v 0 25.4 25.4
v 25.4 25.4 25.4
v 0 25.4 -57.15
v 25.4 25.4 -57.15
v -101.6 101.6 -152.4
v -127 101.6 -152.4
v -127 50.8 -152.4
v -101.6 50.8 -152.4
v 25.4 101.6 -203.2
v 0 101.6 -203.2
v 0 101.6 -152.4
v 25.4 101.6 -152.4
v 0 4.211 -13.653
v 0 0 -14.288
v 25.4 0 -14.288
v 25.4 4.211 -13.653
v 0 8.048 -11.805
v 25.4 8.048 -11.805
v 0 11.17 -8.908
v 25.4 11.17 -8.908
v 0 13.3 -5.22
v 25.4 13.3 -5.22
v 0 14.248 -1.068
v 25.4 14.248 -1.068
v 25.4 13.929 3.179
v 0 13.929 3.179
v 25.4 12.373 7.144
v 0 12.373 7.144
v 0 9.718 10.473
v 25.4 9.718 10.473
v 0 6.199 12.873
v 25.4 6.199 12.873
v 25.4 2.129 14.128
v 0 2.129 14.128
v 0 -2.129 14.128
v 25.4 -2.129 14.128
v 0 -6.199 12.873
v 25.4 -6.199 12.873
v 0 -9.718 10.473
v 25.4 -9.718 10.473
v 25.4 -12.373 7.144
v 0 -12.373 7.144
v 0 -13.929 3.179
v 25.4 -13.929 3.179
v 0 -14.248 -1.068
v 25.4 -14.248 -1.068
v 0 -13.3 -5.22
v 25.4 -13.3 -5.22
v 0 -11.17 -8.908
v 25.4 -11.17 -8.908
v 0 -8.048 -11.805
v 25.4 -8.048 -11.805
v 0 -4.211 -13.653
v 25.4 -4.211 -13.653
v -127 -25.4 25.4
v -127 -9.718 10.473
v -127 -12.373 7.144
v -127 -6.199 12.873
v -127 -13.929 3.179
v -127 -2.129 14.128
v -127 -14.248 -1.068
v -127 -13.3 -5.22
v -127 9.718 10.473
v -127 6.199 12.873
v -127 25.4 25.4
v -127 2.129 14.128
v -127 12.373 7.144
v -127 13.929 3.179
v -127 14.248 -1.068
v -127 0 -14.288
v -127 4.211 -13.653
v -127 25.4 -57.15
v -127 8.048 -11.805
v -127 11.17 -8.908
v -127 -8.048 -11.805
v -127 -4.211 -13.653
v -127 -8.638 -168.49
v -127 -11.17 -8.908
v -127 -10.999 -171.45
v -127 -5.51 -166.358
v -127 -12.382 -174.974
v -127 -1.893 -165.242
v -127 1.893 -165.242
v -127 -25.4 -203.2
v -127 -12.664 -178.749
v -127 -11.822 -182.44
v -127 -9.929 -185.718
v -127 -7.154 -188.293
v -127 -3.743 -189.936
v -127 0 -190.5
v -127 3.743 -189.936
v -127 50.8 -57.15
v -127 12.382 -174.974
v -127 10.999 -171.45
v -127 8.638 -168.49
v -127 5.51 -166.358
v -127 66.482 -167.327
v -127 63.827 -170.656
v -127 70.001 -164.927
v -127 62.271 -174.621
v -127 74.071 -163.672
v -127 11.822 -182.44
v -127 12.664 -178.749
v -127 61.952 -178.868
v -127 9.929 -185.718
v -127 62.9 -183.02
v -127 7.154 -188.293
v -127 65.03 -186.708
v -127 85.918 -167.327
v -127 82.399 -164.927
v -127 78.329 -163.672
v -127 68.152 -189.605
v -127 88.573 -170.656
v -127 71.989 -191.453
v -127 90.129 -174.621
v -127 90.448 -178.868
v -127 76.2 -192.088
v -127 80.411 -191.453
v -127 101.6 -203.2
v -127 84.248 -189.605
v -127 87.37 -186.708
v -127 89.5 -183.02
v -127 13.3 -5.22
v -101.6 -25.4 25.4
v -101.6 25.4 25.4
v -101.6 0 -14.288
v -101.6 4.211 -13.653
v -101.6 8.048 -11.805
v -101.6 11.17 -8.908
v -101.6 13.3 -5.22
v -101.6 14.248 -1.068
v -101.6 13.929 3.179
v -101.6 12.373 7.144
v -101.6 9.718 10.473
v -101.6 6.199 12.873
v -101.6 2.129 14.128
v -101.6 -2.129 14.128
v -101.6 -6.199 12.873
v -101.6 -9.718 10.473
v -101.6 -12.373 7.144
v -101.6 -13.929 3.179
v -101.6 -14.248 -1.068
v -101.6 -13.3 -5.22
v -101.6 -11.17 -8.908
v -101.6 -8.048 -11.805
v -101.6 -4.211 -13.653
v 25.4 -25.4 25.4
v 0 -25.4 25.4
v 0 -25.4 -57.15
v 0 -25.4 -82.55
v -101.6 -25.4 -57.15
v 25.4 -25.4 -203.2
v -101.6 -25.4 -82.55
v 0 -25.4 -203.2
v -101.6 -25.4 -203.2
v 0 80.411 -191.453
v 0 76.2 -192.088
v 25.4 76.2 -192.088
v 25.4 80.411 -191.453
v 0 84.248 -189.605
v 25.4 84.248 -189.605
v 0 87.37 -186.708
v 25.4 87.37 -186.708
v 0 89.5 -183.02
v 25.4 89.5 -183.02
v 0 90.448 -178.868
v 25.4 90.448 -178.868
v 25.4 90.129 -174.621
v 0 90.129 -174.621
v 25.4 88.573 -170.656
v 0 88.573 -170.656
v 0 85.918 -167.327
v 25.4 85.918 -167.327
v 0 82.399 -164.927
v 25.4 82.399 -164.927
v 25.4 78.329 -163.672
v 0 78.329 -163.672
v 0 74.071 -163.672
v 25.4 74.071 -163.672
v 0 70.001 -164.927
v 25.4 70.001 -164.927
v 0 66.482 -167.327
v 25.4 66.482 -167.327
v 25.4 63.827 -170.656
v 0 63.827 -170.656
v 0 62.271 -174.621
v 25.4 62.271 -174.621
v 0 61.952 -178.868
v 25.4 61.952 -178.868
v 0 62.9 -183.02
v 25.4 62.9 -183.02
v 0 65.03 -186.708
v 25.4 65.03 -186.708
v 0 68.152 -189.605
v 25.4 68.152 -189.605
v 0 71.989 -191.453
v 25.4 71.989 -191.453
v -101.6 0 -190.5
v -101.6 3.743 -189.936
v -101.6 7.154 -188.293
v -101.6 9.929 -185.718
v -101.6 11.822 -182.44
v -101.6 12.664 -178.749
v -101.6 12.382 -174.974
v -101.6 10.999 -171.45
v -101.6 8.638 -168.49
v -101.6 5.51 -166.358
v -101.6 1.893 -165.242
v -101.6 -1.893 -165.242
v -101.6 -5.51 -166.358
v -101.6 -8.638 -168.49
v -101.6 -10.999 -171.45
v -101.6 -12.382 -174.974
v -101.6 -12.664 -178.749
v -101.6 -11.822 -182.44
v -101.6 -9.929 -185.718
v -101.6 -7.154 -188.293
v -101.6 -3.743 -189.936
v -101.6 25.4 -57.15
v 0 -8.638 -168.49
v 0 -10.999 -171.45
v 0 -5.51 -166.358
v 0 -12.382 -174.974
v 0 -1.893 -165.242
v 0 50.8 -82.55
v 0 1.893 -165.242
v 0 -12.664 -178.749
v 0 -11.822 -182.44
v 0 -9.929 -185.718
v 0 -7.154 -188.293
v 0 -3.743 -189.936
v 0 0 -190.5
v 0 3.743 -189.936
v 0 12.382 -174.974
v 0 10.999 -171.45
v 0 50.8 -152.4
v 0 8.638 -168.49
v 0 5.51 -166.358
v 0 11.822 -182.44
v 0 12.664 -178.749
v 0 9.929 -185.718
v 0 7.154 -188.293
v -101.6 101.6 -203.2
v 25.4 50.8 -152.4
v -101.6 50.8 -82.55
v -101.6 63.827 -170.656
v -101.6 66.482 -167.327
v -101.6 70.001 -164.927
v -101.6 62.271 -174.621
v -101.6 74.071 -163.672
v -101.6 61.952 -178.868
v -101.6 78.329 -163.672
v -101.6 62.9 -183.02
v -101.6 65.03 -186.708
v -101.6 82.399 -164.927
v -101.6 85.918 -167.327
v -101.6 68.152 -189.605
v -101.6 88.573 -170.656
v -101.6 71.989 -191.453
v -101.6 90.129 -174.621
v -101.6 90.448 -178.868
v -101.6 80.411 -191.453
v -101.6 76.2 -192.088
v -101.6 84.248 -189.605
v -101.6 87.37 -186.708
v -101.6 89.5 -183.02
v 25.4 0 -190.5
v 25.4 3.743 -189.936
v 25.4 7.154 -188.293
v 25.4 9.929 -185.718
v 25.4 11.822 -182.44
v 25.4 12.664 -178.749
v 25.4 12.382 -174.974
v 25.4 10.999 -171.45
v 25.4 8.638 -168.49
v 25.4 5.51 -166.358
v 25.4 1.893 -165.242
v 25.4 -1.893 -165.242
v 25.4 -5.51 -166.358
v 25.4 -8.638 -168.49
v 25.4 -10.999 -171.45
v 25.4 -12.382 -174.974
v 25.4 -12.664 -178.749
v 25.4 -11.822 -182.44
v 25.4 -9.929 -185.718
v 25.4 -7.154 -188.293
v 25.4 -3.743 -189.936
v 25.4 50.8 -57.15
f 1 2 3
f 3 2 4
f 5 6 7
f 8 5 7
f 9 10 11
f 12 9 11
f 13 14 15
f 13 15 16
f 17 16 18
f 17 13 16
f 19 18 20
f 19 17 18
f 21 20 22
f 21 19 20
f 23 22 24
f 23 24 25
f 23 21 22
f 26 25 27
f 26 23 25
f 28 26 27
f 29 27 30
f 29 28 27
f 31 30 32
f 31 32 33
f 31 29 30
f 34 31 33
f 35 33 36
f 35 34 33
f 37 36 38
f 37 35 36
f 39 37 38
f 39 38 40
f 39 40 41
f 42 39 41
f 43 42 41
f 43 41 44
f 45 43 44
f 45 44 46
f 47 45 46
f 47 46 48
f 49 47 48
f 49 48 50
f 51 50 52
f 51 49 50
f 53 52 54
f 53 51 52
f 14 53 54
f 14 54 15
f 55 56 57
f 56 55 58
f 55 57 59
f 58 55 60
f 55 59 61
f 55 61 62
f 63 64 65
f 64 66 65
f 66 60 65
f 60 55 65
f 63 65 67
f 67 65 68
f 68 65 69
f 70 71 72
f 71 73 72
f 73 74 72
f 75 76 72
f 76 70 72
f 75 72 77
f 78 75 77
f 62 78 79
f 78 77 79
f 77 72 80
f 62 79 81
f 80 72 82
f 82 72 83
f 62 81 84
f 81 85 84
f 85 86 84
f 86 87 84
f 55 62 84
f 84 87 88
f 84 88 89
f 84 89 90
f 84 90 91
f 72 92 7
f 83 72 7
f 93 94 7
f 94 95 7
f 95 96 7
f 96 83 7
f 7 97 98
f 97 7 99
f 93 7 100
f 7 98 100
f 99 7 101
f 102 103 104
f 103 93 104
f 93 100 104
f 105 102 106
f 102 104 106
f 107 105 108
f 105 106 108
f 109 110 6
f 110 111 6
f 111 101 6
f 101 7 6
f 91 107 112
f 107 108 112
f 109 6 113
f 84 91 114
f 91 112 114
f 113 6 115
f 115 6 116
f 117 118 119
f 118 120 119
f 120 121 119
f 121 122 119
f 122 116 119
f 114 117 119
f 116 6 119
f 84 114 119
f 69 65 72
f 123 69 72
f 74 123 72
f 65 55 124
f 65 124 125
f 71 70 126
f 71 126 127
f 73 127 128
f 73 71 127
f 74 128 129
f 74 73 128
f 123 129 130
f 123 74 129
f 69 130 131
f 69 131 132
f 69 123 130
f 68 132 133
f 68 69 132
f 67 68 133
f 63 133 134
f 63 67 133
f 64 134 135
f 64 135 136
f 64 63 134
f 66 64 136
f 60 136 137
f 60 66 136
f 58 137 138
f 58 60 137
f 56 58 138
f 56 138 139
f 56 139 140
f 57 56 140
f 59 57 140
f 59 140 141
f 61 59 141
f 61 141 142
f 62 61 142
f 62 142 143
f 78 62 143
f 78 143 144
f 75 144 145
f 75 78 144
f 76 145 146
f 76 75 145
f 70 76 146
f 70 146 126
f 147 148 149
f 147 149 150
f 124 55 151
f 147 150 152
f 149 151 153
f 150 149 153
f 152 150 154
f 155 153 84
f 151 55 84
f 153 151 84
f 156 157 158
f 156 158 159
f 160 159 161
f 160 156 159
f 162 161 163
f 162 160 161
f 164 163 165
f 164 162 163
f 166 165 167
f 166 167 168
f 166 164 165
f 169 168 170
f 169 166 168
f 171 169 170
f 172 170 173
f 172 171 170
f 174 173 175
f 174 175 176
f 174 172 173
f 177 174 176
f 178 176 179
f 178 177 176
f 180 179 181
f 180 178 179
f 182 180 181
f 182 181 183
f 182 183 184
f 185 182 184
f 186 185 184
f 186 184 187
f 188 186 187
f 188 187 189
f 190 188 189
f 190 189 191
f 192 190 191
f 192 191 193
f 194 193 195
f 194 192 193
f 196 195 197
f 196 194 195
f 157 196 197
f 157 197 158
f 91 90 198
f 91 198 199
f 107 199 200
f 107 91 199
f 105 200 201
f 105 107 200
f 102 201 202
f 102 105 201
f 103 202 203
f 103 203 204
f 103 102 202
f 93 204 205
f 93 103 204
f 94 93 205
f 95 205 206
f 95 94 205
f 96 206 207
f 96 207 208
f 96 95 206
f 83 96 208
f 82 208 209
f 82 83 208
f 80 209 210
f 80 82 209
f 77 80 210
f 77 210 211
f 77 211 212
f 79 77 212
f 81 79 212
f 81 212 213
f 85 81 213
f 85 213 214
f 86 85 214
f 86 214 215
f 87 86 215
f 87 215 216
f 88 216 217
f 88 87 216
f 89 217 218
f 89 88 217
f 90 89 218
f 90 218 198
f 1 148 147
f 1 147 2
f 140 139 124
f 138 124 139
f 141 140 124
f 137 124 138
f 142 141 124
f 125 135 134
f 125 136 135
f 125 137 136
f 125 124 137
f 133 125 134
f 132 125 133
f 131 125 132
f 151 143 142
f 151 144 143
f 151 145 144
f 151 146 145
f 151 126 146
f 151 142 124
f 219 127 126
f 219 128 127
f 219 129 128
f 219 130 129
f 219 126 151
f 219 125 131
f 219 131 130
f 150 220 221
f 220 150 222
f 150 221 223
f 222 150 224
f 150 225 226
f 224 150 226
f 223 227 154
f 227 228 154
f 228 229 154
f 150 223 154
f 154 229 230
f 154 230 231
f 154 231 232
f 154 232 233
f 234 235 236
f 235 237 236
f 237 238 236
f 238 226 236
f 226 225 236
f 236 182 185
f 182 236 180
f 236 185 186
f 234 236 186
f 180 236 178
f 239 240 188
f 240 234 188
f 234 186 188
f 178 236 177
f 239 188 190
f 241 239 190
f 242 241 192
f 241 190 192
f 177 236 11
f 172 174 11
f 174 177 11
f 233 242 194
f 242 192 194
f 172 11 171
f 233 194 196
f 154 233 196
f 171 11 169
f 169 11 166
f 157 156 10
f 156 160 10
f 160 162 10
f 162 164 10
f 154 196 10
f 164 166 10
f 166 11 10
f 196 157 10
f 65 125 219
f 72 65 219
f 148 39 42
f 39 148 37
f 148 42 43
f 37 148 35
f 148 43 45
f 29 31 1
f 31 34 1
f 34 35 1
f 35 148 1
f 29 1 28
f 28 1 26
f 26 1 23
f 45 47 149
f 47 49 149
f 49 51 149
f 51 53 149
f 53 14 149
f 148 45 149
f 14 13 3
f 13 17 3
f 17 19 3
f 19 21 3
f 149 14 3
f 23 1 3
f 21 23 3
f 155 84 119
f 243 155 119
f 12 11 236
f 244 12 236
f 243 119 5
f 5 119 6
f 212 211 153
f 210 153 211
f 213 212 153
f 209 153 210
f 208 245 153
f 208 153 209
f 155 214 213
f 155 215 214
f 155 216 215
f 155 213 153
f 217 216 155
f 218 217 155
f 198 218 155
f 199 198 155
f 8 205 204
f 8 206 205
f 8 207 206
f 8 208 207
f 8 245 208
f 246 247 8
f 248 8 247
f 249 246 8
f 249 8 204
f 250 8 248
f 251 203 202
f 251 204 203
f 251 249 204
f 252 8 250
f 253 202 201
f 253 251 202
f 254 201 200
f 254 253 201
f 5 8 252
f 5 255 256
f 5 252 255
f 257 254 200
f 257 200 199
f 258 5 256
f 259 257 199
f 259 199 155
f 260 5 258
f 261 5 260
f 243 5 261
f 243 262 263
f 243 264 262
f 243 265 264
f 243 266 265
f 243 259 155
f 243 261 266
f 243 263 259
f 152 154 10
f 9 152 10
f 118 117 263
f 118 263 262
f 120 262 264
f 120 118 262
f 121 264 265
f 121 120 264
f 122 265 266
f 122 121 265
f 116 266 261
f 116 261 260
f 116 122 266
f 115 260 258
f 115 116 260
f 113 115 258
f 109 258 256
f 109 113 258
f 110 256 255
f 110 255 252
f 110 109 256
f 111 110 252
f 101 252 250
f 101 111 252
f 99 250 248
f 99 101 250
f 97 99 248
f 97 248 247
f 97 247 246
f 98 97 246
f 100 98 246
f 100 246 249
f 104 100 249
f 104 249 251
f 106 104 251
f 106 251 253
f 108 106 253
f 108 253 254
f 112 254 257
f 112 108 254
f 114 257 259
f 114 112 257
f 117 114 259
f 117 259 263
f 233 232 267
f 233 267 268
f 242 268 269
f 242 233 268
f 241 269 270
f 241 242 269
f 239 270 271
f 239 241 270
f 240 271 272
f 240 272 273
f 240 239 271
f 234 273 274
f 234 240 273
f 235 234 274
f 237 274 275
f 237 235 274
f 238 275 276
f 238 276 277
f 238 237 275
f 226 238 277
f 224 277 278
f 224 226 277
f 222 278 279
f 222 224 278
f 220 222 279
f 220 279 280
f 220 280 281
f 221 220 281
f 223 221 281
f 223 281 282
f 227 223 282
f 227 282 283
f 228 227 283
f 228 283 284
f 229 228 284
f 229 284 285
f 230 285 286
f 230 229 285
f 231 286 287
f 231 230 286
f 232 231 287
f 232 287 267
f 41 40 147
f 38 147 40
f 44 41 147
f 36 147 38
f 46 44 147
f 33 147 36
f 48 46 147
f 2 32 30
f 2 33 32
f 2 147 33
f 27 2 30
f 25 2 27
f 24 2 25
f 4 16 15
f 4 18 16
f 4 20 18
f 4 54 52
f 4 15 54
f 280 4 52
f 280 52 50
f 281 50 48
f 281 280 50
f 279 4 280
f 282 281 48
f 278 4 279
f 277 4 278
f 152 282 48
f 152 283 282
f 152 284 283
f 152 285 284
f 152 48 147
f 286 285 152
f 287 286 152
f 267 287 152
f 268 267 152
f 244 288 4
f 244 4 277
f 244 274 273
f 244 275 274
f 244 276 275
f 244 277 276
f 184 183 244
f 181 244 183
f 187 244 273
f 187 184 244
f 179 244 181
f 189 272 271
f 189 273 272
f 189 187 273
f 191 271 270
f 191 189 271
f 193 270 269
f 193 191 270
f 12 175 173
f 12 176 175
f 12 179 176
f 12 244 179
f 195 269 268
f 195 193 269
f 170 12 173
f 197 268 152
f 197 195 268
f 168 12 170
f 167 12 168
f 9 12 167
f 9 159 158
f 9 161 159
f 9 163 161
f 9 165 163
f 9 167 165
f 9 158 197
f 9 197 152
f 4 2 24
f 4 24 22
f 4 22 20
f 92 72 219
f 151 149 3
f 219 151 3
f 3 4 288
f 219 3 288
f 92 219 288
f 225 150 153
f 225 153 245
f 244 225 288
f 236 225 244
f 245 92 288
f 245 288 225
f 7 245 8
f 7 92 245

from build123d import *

# Parameters (mm, degrees)
SKETCH1_W           = 82.55
SKETCH1_H           = 76.2
SKETCH1_R           = 14.2875
SKETCH1_W_2         = 25.4
SKETCH1_R_2         = 12.7
BOSS_EXTRUDE1_DEPTH = 25.4
SKETCH1_3_W         = 25.4
SKETCH1_3_H         = 76.2
BOSS_EXTRUDE2_DEPTH = 101.6
BOSS_EXTRUDE4_START = -127
SKETCH1_4_W         = 25.4
SKETCH1_4_H         = 76.2
SKETCH1_4_R         = 12.7
SKETCH1_4_R_2       = 14.2875
SKETCH1_4_W_2       = 82.55
BOSS_EXTRUDE4_DEPTH = 25.4
SKETCH2_W           = 82.55
SKETCH2_H           = 25.4
CUT_EXTRUDE1_DEPTH  = 274.566372202


with BuildPart() as part:
    # Sketch1 → Boss-Extrude1 (new body)
    # profile 1 of 3: a face of its own
    with BuildSketch(Plane(origin=(0, 0, 0), x_dir=(0, 0, -1), z_dir=(1, 0, 0))):
        with Locations((15.875, 12.7)):
            Rectangle(SKETCH1_W, SKETCH1_H)
        Circle(SKETCH1_R, mode=Mode.SUBTRACT)
    # profile 2 of 3: a face of its own
    with BuildSketch(Plane(origin=(0, 0, 0), x_dir=(0, 0, -1), z_dir=(1, 0, 0))):
        with Locations((69.85, 12.7)):
            Rectangle(SKETCH1_W_2, SKETCH1_H)
    # profile 3 of 3: a face of its own
    with BuildSketch(Plane(origin=(0, 0, 0), x_dir=(0, 0, -1), z_dir=(1, 0, 0))):
        Polygon((82.55, 50.8), (82.55, -25.4), (203.2, -25.4), (203.2, 101.6), (152.4, 101.6), (152.4, 50.8), align=None)
        with Locations((177.8, 0)):
            Circle(SKETCH1_R_2, mode=Mode.SUBTRACT)
        with Locations((177.8, 76.2)):
            Circle(SKETCH1_R, mode=Mode.SUBTRACT)
    extrude(amount=BOSS_EXTRUDE1_DEPTH)

    # Sketch1<3> → Boss-Extrude2 (add)
    with BuildSketch(Plane(origin=(0, 0, 0), x_dir=(0, 0, -1), z_dir=(1, 0, 0))):
        with Locations((69.85, 12.7)):
            Rectangle(SKETCH1_3_W, SKETCH1_3_H)
    extrude(amount=-BOSS_EXTRUDE2_DEPTH)

    # Sketch1<4> → Boss-Extrude4 (add)
    # profile 1 of 3: a face of its own
    with BuildSketch(Plane(origin=(0, 0, 0), x_dir=(0, 0, -1), z_dir=(1, 0, 0)).offset(BOSS_EXTRUDE4_START)):
        with Locations((69.85, 12.7)):
            Rectangle(SKETCH1_4_W, SKETCH1_4_H)
    # profile 2 of 3: a face of its own
    with BuildSketch(Plane(origin=(0, 0, 0), x_dir=(0, 0, -1), z_dir=(1, 0, 0)).offset(BOSS_EXTRUDE4_START)):
        Polygon((82.55, 50.8), (82.55, -25.4), (203.2, -25.4), (203.2, 101.6), (152.4, 101.6), (152.4, 50.8), align=None)
        with Locations((177.8, 0)):
            Circle(SKETCH1_4_R, mode=Mode.SUBTRACT)
        with Locations((177.8, 76.2)):
            Circle(SKETCH1_4_R_2, mode=Mode.SUBTRACT)
    # profile 3 of 3: a face of its own
    with BuildSketch(Plane(origin=(0, 0, 0), x_dir=(0, 0, -1), z_dir=(1, 0, 0)).offset(BOSS_EXTRUDE4_START)):
        with Locations((15.875, 12.7)):
            Rectangle(SKETCH1_4_W_2, SKETCH1_4_H)
        Circle(SKETCH1_4_R_2, mode=Mode.SUBTRACT)
    extrude(amount=BOSS_EXTRUDE4_DEPTH)

    # Sketch2 → Cut-Extrude1 (cut, through all)
    with BuildSketch(Plane(origin=(25.4, 0, 0), x_dir=(0, 0, -1), z_dir=(1, 0, 0))):
        with Locations((15.875, 38.1)):
            Rectangle(SKETCH2_W, SKETCH2_H)
    extrude(amount=-CUT_EXTRUDE1_DEPTH, mode=Mode.SUBTRACT)


solid = part.part
